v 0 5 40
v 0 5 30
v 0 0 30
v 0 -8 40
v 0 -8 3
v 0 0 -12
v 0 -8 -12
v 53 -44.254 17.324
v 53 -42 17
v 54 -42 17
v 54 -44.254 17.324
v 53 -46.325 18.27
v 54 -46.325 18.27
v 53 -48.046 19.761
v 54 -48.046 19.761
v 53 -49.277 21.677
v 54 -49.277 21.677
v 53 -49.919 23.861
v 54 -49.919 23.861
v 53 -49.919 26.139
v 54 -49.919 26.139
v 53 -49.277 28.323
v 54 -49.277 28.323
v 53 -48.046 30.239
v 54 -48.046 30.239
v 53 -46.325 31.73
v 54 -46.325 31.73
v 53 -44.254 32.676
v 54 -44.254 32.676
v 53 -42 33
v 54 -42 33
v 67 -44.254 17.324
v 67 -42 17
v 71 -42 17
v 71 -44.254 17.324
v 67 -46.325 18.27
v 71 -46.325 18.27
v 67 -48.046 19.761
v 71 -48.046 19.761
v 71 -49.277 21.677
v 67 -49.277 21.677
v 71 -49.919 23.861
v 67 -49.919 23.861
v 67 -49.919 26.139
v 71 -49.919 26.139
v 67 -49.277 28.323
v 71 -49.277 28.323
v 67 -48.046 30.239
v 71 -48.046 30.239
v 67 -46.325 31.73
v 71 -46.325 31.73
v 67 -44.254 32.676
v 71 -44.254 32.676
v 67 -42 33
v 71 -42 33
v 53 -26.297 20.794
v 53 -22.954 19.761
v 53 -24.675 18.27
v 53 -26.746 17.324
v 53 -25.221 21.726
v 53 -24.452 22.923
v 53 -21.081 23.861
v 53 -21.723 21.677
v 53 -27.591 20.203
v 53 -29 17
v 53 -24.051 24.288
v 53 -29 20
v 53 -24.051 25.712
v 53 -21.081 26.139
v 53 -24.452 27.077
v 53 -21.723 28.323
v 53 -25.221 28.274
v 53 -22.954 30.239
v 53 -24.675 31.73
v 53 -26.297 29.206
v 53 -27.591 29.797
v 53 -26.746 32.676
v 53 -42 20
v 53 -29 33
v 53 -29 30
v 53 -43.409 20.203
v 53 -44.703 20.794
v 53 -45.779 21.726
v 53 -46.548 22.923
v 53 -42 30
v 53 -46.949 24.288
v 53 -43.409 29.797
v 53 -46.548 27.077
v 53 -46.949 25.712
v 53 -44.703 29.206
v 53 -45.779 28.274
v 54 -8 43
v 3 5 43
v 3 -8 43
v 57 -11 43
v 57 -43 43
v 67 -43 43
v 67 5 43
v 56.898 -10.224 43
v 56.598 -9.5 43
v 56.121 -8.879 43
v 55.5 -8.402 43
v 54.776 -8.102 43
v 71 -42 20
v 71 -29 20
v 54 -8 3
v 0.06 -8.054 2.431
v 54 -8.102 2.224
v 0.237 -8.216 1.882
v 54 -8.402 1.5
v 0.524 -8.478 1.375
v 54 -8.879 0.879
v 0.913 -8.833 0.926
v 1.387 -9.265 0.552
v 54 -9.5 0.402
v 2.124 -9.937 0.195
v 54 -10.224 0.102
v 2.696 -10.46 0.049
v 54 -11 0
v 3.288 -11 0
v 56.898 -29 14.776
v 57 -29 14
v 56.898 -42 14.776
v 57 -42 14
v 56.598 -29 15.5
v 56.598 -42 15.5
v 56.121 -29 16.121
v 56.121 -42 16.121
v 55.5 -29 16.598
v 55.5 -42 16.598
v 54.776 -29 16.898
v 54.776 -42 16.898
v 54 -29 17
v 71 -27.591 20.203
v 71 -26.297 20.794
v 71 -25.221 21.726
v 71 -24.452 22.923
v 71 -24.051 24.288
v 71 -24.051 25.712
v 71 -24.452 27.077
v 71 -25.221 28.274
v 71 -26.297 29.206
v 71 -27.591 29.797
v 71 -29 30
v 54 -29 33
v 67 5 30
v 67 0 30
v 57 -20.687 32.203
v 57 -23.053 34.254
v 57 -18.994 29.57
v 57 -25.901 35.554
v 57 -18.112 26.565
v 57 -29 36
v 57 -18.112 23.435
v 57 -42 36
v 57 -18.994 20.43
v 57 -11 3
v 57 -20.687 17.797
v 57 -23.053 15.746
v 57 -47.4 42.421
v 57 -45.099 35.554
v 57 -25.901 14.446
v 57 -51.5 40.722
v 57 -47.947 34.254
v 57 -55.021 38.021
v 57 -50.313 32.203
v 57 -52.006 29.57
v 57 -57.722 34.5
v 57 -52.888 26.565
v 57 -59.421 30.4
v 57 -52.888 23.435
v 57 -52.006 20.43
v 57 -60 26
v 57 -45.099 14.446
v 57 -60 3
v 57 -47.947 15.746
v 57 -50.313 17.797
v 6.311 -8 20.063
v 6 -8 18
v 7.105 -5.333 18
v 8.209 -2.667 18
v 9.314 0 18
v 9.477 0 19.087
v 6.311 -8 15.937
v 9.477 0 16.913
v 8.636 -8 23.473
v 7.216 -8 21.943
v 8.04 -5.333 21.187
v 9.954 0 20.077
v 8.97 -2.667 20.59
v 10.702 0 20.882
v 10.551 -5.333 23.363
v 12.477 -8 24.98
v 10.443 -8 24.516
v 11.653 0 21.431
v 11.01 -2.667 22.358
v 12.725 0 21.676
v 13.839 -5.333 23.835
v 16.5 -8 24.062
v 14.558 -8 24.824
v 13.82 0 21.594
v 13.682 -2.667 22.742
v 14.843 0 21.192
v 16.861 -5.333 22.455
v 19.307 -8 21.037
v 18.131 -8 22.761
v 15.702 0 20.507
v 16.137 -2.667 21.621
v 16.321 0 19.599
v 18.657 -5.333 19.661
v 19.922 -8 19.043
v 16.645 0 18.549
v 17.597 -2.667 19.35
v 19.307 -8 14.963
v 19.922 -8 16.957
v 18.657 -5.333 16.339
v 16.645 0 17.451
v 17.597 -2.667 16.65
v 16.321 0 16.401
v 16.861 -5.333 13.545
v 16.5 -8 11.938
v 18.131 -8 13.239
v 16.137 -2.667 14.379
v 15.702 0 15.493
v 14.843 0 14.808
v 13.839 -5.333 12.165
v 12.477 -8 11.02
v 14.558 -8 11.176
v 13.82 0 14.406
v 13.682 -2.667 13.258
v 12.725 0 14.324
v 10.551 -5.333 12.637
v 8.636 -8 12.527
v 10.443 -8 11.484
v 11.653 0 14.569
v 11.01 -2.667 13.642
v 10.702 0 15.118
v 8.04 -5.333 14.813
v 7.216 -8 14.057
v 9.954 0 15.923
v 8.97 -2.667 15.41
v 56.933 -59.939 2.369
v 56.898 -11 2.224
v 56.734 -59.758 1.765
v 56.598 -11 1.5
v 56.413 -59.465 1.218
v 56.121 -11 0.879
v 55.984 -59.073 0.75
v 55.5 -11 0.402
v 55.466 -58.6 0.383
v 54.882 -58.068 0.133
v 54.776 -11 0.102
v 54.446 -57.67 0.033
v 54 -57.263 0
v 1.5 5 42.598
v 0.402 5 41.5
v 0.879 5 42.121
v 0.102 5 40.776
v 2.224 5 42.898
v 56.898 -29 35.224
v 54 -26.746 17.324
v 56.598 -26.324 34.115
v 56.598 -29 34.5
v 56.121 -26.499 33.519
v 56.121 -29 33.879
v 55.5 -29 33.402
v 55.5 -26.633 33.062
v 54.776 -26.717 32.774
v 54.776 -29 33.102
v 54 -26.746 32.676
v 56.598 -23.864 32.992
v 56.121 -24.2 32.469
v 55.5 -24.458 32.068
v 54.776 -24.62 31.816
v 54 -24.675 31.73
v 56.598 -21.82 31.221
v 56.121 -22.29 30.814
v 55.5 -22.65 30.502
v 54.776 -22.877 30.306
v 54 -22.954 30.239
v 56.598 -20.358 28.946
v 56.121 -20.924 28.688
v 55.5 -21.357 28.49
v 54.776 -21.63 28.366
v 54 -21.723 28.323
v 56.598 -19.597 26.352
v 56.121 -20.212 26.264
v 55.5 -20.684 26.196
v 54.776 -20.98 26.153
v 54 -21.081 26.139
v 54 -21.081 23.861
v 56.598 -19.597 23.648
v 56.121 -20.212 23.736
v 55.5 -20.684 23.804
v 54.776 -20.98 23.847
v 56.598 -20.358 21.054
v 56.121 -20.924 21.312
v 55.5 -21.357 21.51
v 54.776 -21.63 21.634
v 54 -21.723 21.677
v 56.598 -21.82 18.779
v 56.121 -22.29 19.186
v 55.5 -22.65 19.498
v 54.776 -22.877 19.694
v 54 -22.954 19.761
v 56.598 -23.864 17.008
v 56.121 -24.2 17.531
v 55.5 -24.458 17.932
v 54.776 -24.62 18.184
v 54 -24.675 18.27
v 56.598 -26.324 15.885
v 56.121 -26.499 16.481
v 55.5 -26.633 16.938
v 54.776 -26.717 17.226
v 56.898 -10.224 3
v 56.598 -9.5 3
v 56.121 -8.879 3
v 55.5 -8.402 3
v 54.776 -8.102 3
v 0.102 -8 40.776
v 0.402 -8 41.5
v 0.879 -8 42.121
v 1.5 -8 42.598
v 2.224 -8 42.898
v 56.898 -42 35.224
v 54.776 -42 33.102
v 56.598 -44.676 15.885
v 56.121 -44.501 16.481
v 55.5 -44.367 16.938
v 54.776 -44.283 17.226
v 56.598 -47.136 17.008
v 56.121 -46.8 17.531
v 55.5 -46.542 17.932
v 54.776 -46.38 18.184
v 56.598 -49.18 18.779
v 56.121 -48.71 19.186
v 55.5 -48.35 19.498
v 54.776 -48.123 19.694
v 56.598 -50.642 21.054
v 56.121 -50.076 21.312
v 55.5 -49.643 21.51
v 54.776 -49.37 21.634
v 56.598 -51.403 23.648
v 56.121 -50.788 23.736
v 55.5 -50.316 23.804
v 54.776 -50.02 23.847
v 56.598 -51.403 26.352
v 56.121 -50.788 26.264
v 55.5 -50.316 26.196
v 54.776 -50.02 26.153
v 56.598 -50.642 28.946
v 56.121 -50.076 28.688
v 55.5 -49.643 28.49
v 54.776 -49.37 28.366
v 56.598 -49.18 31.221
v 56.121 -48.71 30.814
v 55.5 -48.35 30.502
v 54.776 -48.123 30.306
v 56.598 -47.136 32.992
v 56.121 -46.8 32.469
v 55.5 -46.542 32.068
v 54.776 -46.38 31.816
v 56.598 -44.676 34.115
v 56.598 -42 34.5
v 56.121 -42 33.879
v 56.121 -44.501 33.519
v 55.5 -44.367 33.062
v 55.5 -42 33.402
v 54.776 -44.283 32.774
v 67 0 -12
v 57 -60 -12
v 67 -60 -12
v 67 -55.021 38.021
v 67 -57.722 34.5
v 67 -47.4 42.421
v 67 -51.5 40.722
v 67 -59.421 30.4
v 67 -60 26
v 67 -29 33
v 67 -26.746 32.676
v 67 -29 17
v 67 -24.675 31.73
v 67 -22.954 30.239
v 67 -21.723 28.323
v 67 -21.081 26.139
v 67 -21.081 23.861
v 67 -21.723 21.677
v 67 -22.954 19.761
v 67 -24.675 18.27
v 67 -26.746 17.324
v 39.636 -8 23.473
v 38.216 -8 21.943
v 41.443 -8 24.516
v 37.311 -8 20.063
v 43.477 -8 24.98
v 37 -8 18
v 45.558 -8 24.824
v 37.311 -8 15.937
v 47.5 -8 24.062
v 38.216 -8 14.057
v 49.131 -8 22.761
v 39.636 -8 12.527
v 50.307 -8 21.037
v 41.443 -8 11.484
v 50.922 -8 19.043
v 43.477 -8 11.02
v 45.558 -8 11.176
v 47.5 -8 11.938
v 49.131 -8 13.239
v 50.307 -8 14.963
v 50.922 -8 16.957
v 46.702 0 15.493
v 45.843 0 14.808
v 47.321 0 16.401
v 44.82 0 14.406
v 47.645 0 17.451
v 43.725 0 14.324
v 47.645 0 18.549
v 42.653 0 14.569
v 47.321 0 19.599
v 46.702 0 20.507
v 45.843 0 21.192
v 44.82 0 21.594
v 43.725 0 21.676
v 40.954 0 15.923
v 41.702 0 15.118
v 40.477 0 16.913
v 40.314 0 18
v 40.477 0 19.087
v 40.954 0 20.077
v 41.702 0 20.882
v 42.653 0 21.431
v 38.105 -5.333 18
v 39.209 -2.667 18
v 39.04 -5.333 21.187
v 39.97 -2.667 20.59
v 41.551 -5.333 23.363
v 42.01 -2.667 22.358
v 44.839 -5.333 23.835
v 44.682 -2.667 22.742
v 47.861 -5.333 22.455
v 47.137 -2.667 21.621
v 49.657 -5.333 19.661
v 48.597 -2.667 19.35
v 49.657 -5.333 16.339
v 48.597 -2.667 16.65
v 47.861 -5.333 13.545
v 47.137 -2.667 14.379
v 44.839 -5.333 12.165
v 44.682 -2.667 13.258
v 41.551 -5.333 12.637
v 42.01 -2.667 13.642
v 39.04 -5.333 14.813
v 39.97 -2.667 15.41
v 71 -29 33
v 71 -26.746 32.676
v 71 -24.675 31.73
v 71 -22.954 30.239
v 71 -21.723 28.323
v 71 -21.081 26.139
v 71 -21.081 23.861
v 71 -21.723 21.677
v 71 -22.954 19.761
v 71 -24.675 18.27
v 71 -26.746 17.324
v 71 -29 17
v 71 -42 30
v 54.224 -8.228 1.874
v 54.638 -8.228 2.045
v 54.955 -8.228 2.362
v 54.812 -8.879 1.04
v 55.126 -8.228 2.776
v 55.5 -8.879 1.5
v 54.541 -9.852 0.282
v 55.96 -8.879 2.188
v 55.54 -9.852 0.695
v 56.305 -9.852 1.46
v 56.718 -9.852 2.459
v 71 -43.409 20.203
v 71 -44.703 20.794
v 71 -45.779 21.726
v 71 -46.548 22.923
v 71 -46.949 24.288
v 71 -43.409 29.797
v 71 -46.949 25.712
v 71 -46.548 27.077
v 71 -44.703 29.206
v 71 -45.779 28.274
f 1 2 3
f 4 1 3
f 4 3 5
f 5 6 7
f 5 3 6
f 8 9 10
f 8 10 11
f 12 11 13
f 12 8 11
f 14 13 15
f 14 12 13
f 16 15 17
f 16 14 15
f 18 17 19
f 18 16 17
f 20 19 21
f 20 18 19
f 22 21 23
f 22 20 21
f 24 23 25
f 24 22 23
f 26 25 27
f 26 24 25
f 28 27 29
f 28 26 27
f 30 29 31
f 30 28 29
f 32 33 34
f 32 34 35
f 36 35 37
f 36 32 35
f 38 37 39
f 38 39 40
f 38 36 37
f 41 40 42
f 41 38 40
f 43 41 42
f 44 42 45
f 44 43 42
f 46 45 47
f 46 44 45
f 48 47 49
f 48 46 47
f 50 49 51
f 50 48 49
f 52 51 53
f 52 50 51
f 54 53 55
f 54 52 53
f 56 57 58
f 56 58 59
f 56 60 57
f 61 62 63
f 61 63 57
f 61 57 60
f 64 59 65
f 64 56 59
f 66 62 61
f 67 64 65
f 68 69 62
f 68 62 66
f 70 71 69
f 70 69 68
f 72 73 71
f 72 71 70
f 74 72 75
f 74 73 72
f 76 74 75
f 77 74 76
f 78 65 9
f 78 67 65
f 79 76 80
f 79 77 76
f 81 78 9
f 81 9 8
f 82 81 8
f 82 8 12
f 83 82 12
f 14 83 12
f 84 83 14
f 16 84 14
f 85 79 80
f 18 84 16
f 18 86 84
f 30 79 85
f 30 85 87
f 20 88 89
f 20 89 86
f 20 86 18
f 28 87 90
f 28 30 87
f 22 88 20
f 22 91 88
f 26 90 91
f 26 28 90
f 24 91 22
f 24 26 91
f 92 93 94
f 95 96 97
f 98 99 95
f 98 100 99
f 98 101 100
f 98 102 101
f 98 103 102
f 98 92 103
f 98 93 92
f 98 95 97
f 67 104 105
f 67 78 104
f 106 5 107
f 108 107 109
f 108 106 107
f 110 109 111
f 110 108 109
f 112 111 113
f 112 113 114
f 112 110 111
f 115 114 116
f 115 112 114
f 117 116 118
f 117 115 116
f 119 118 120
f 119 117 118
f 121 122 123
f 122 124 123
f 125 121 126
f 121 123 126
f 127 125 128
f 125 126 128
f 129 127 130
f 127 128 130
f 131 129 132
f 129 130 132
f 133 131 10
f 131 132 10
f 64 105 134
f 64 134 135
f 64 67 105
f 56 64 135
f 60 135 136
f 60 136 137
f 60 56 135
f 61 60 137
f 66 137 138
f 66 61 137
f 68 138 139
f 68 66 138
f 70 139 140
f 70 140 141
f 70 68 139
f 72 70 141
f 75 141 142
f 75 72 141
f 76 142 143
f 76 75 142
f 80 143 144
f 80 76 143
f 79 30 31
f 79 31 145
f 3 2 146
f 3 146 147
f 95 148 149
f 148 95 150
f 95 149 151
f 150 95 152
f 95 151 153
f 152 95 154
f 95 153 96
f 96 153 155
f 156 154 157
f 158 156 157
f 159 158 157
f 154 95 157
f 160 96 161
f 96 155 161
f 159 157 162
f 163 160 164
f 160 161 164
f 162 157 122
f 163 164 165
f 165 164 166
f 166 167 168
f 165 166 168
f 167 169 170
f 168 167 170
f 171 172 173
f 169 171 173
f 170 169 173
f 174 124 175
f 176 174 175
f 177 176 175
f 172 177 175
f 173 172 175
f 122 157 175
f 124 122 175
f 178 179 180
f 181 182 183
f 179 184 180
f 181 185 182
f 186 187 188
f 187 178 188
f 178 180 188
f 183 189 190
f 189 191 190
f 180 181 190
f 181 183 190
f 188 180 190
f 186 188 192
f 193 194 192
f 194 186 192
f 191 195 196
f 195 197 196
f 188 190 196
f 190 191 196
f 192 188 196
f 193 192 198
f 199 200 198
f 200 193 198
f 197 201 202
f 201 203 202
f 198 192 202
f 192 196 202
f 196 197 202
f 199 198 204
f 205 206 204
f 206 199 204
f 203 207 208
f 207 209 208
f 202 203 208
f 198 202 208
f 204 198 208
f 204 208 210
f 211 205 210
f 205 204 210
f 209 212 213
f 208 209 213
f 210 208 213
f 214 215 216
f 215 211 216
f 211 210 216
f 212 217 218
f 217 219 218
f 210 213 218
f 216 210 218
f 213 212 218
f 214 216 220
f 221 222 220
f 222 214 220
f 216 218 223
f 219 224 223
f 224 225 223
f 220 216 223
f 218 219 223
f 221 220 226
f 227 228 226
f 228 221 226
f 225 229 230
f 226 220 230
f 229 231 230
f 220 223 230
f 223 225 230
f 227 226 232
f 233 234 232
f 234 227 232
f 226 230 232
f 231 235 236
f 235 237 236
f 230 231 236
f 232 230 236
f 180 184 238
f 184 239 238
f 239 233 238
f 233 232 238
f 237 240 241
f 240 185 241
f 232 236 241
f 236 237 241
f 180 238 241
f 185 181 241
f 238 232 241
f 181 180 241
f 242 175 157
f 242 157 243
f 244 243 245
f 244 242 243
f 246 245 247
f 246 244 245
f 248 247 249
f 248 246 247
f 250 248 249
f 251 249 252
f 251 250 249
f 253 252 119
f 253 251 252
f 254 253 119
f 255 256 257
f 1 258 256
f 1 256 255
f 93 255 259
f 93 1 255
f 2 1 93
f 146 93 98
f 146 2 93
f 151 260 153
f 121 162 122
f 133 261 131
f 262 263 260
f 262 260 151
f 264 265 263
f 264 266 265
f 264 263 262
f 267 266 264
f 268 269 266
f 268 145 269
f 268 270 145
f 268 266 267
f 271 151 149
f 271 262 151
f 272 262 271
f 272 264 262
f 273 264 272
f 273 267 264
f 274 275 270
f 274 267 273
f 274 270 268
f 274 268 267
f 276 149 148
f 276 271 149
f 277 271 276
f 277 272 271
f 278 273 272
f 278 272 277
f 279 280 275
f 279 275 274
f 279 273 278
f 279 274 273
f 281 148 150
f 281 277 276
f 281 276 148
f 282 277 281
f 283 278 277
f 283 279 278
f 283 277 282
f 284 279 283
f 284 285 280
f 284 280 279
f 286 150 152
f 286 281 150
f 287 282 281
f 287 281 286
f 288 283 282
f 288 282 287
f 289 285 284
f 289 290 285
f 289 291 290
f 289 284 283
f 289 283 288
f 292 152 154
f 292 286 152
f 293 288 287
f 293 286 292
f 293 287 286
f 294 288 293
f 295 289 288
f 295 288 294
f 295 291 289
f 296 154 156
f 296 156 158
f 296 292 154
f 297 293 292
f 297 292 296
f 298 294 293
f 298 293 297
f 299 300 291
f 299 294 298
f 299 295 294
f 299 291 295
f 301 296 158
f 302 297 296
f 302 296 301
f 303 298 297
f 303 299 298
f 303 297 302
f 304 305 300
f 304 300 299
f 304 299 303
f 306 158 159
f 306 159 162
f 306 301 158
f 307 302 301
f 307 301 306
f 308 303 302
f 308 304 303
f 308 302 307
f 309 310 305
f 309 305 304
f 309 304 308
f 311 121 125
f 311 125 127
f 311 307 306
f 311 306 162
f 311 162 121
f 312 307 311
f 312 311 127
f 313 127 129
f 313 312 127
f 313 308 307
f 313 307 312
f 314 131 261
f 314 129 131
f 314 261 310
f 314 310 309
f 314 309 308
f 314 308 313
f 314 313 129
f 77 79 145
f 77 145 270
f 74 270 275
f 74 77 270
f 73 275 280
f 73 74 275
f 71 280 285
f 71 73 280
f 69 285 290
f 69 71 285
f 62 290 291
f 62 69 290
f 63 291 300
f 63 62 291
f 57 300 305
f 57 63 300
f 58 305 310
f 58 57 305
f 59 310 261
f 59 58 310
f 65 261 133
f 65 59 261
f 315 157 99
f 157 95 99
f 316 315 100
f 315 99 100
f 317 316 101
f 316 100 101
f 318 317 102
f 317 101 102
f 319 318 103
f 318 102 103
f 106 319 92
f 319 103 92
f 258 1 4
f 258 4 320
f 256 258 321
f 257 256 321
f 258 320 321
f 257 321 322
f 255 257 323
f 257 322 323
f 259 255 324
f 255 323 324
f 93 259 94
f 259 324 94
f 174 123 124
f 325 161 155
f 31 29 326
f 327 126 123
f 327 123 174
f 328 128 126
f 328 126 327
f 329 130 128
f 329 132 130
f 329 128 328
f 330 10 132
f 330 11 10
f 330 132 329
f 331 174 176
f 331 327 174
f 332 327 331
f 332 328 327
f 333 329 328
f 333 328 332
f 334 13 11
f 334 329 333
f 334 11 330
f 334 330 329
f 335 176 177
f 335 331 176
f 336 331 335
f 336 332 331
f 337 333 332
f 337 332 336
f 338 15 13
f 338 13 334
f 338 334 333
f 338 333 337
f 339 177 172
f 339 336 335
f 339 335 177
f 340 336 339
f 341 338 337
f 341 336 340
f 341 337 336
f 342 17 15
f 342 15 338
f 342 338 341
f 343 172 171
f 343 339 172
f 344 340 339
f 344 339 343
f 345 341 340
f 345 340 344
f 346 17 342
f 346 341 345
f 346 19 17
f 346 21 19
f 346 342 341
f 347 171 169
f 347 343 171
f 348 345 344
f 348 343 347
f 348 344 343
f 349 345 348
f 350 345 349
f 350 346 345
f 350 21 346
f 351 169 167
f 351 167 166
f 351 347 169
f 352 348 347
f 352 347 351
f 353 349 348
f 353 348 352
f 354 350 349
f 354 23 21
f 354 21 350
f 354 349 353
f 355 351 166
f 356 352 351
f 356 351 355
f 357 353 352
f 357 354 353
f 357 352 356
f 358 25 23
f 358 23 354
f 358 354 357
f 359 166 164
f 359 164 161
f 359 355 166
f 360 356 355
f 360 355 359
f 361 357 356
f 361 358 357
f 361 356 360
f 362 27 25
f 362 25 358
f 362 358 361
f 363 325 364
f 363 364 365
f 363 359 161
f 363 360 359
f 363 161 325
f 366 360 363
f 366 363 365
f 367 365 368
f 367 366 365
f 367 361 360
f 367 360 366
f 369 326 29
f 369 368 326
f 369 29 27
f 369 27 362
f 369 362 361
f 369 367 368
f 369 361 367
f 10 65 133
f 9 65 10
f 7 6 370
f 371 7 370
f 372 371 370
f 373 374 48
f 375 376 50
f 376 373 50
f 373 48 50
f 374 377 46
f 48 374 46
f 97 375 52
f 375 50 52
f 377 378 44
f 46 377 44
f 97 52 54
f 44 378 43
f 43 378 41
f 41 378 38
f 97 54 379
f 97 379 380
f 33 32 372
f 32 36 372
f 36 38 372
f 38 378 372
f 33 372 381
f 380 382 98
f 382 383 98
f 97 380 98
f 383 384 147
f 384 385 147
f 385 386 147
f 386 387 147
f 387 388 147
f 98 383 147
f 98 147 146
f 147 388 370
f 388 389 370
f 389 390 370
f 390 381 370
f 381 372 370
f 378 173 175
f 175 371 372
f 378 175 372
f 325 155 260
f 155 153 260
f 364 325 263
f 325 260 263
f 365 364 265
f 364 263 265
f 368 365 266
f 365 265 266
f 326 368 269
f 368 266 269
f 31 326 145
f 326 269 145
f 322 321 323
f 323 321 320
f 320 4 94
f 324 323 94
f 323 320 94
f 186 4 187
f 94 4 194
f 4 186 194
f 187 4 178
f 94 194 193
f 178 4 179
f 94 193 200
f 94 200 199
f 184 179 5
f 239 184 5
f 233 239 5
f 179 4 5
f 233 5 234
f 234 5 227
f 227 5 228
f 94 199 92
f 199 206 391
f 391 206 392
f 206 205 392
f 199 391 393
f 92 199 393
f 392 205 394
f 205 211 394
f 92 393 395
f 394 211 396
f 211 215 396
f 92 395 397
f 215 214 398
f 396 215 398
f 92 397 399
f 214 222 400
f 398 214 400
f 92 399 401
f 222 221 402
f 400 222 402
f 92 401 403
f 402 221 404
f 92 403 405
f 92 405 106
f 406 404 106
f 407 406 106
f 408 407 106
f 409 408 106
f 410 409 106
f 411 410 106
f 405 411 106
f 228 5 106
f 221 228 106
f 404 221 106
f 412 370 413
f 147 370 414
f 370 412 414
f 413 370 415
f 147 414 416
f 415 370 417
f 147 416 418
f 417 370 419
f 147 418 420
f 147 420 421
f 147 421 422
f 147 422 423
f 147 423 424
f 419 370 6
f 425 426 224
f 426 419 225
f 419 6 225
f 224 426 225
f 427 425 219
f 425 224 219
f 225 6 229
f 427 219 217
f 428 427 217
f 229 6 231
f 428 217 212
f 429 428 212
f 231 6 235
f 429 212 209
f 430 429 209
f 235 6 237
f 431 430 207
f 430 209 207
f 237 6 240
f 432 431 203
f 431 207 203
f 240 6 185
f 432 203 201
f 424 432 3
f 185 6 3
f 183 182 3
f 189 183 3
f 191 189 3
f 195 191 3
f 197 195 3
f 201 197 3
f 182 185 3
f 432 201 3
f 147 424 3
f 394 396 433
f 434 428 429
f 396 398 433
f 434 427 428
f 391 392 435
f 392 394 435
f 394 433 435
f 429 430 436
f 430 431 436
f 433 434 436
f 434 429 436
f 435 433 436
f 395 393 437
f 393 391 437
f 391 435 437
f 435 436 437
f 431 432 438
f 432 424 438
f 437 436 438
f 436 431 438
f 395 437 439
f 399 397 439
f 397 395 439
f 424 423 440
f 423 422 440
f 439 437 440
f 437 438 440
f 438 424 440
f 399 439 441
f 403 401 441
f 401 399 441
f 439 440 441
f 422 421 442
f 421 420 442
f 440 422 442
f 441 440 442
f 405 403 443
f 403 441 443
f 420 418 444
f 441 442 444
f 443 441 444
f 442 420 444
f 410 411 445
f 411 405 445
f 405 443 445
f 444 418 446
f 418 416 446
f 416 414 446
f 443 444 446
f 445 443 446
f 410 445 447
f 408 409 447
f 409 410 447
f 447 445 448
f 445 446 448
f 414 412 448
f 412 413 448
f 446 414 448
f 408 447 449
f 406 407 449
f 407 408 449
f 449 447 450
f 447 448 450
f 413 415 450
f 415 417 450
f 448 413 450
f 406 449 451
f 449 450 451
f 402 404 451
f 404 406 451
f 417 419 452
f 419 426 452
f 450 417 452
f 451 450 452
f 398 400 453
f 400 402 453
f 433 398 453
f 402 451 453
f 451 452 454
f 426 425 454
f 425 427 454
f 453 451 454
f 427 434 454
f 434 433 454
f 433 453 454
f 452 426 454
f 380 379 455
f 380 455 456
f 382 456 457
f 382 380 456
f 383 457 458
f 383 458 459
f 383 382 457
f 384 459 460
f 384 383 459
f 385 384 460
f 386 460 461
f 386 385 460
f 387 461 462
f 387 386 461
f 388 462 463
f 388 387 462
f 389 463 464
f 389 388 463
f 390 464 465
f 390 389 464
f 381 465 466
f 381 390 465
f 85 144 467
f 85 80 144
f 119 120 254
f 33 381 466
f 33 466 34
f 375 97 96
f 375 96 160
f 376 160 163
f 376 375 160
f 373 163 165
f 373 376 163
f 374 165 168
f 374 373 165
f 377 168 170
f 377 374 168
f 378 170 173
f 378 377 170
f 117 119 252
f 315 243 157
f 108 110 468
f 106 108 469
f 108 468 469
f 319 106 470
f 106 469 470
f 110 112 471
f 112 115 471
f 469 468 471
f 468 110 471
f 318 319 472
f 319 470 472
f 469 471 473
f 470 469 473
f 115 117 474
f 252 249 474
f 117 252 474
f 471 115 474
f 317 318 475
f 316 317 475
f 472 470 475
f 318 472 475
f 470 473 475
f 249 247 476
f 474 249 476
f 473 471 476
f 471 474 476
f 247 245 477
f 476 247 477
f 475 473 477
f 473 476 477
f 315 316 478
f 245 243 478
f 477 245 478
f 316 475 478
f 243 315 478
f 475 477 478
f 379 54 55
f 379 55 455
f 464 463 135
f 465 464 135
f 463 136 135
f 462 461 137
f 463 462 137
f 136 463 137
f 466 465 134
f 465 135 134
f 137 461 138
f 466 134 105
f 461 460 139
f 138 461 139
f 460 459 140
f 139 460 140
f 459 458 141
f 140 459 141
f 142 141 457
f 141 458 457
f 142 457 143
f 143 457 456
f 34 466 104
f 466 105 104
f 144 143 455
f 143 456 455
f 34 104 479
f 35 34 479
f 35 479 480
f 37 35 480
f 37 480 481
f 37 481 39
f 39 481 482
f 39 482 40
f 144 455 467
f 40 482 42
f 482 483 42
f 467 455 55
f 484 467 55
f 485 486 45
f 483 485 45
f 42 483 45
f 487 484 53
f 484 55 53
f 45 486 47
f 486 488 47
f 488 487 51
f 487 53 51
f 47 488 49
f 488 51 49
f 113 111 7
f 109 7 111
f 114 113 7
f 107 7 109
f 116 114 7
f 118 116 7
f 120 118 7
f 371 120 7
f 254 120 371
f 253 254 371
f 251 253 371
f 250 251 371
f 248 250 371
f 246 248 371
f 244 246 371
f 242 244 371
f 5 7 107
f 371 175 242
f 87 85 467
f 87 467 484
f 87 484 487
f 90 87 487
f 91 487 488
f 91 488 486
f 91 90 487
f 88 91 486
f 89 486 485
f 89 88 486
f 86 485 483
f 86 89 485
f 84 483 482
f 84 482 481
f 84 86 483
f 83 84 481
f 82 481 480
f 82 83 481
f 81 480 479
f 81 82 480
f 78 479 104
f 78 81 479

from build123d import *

# Parameters (mm, degrees)
F0_W           = 67
F0_H           = 5
F1_DEPTH       = 12
F2_DEPTH       = 43
F5_DEPTH       = 9
F6_W           = 5
F6_H           = 42
F7_DEPTH       = 100
F9_D           = 5
F9_CSINK_D     = 14
F9_CSINK_ANGLE = 45
F10_R          = 3


# Not quite as in the source:
# - a feature names something its author has since deleted; it is built from what else it names


with BuildPart() as f1:
    # F0 (on Top) → F1 (new body)
    with BuildSketch(Plane.XY):
        Polygon((57, -8), (0, -8), (57, -60), align=None)
        Polygon((67, 0), (0, 0), (0, -8), (57, -8), (57, -60), (67, -60), align=None)
        with Locations((33.5, 2.5)):
            Rectangle(F0_W, F0_H)
    extrude(amount=-F1_DEPTH)

    # F0 (on Top) → F2 (join)
    with BuildSketch(Plane.XY):
        Polygon((67, 0), (0, 0), (0, -8), (57, -8), (57, -60), (67, -60), align=None)
        with Locations((33.5, 2.5)):
            Rectangle(F0_W, F0_H)
    extrude(amount=F2_DEPTH)

    # F4 (on mid) → F5 (join, symmetric)
    with BuildSketch(Plane(origin=(62, 0, 0), x_dir=(0, -1, 0), z_dir=(-1, 0, 0))):
        with BuildLine():
            Line((42, 33), (29, 33))
            ThreePointArc((29, 33), (21, 25), (29, 17))
            Line((29, 17), (42, 17))
            ThreePointArc((42, 17), (50, 25), (42, 33))
        make_face()
        with BuildLine():
            ThreePointArc((42, 30), (47, 25), (42, 20))
            Line((42, 20), (29, 20))
            ThreePointArc((29, 20), (24, 25), (29, 30))
            Line((29, 30), (42, 30))
        make_face(mode=Mode.SUBTRACT)
    extrude(amount=F5_DEPTH, both=True)

    # F6 (on mid) → F7 (cut, symmetric)
    with BuildSketch(Plane(origin=(62, 0, 0), x_dir=(0, -1, 0), z_dir=(-1, 0, 0))):
        with BuildLine():
            ThreePointArc((43, 43), (55.0208152802, 38.0208152802), (60, 26))
            Line((60, 26), (60, 43))
            Line((60, 43), (43, 43))
        make_face()
        with BuildLine():
            Line((42, 30), (29, 30))
            ThreePointArc((29, 30), (24, 25), (29, 20))
            Line((29, 20), (42, 20))
            ThreePointArc((42, 20), (47, 25), (42, 30))
        make_face()
        with Locations((-2.5, 9)):
            Rectangle(F6_W, F6_H)
    extrude(amount=F7_DEPTH, both=True, mode=Mode.SUBTRACT)

    # F9 (through all)
    with Locations(Plane.XZ.offset(8)):
        with Locations((13, 18), (44, 18)):
            CounterSinkHole(F9_D / 2, F9_CSINK_D / 2, counter_sink_angle=F9_CSINK_ANGLE)

    # F10
    f10_edges = [f1.edges().sort_by_distance(p)[0] for p in [
        (57, -21, 25),
        (57, -35.5, 33),
        (57, -34, 0),
        (28.5, -8, 0),
        (57, -8, 21.5),
        (0, -1.5, 43),
    ]]
    fillet(f10_edges, radius=F10_R)


solid = f1.part
